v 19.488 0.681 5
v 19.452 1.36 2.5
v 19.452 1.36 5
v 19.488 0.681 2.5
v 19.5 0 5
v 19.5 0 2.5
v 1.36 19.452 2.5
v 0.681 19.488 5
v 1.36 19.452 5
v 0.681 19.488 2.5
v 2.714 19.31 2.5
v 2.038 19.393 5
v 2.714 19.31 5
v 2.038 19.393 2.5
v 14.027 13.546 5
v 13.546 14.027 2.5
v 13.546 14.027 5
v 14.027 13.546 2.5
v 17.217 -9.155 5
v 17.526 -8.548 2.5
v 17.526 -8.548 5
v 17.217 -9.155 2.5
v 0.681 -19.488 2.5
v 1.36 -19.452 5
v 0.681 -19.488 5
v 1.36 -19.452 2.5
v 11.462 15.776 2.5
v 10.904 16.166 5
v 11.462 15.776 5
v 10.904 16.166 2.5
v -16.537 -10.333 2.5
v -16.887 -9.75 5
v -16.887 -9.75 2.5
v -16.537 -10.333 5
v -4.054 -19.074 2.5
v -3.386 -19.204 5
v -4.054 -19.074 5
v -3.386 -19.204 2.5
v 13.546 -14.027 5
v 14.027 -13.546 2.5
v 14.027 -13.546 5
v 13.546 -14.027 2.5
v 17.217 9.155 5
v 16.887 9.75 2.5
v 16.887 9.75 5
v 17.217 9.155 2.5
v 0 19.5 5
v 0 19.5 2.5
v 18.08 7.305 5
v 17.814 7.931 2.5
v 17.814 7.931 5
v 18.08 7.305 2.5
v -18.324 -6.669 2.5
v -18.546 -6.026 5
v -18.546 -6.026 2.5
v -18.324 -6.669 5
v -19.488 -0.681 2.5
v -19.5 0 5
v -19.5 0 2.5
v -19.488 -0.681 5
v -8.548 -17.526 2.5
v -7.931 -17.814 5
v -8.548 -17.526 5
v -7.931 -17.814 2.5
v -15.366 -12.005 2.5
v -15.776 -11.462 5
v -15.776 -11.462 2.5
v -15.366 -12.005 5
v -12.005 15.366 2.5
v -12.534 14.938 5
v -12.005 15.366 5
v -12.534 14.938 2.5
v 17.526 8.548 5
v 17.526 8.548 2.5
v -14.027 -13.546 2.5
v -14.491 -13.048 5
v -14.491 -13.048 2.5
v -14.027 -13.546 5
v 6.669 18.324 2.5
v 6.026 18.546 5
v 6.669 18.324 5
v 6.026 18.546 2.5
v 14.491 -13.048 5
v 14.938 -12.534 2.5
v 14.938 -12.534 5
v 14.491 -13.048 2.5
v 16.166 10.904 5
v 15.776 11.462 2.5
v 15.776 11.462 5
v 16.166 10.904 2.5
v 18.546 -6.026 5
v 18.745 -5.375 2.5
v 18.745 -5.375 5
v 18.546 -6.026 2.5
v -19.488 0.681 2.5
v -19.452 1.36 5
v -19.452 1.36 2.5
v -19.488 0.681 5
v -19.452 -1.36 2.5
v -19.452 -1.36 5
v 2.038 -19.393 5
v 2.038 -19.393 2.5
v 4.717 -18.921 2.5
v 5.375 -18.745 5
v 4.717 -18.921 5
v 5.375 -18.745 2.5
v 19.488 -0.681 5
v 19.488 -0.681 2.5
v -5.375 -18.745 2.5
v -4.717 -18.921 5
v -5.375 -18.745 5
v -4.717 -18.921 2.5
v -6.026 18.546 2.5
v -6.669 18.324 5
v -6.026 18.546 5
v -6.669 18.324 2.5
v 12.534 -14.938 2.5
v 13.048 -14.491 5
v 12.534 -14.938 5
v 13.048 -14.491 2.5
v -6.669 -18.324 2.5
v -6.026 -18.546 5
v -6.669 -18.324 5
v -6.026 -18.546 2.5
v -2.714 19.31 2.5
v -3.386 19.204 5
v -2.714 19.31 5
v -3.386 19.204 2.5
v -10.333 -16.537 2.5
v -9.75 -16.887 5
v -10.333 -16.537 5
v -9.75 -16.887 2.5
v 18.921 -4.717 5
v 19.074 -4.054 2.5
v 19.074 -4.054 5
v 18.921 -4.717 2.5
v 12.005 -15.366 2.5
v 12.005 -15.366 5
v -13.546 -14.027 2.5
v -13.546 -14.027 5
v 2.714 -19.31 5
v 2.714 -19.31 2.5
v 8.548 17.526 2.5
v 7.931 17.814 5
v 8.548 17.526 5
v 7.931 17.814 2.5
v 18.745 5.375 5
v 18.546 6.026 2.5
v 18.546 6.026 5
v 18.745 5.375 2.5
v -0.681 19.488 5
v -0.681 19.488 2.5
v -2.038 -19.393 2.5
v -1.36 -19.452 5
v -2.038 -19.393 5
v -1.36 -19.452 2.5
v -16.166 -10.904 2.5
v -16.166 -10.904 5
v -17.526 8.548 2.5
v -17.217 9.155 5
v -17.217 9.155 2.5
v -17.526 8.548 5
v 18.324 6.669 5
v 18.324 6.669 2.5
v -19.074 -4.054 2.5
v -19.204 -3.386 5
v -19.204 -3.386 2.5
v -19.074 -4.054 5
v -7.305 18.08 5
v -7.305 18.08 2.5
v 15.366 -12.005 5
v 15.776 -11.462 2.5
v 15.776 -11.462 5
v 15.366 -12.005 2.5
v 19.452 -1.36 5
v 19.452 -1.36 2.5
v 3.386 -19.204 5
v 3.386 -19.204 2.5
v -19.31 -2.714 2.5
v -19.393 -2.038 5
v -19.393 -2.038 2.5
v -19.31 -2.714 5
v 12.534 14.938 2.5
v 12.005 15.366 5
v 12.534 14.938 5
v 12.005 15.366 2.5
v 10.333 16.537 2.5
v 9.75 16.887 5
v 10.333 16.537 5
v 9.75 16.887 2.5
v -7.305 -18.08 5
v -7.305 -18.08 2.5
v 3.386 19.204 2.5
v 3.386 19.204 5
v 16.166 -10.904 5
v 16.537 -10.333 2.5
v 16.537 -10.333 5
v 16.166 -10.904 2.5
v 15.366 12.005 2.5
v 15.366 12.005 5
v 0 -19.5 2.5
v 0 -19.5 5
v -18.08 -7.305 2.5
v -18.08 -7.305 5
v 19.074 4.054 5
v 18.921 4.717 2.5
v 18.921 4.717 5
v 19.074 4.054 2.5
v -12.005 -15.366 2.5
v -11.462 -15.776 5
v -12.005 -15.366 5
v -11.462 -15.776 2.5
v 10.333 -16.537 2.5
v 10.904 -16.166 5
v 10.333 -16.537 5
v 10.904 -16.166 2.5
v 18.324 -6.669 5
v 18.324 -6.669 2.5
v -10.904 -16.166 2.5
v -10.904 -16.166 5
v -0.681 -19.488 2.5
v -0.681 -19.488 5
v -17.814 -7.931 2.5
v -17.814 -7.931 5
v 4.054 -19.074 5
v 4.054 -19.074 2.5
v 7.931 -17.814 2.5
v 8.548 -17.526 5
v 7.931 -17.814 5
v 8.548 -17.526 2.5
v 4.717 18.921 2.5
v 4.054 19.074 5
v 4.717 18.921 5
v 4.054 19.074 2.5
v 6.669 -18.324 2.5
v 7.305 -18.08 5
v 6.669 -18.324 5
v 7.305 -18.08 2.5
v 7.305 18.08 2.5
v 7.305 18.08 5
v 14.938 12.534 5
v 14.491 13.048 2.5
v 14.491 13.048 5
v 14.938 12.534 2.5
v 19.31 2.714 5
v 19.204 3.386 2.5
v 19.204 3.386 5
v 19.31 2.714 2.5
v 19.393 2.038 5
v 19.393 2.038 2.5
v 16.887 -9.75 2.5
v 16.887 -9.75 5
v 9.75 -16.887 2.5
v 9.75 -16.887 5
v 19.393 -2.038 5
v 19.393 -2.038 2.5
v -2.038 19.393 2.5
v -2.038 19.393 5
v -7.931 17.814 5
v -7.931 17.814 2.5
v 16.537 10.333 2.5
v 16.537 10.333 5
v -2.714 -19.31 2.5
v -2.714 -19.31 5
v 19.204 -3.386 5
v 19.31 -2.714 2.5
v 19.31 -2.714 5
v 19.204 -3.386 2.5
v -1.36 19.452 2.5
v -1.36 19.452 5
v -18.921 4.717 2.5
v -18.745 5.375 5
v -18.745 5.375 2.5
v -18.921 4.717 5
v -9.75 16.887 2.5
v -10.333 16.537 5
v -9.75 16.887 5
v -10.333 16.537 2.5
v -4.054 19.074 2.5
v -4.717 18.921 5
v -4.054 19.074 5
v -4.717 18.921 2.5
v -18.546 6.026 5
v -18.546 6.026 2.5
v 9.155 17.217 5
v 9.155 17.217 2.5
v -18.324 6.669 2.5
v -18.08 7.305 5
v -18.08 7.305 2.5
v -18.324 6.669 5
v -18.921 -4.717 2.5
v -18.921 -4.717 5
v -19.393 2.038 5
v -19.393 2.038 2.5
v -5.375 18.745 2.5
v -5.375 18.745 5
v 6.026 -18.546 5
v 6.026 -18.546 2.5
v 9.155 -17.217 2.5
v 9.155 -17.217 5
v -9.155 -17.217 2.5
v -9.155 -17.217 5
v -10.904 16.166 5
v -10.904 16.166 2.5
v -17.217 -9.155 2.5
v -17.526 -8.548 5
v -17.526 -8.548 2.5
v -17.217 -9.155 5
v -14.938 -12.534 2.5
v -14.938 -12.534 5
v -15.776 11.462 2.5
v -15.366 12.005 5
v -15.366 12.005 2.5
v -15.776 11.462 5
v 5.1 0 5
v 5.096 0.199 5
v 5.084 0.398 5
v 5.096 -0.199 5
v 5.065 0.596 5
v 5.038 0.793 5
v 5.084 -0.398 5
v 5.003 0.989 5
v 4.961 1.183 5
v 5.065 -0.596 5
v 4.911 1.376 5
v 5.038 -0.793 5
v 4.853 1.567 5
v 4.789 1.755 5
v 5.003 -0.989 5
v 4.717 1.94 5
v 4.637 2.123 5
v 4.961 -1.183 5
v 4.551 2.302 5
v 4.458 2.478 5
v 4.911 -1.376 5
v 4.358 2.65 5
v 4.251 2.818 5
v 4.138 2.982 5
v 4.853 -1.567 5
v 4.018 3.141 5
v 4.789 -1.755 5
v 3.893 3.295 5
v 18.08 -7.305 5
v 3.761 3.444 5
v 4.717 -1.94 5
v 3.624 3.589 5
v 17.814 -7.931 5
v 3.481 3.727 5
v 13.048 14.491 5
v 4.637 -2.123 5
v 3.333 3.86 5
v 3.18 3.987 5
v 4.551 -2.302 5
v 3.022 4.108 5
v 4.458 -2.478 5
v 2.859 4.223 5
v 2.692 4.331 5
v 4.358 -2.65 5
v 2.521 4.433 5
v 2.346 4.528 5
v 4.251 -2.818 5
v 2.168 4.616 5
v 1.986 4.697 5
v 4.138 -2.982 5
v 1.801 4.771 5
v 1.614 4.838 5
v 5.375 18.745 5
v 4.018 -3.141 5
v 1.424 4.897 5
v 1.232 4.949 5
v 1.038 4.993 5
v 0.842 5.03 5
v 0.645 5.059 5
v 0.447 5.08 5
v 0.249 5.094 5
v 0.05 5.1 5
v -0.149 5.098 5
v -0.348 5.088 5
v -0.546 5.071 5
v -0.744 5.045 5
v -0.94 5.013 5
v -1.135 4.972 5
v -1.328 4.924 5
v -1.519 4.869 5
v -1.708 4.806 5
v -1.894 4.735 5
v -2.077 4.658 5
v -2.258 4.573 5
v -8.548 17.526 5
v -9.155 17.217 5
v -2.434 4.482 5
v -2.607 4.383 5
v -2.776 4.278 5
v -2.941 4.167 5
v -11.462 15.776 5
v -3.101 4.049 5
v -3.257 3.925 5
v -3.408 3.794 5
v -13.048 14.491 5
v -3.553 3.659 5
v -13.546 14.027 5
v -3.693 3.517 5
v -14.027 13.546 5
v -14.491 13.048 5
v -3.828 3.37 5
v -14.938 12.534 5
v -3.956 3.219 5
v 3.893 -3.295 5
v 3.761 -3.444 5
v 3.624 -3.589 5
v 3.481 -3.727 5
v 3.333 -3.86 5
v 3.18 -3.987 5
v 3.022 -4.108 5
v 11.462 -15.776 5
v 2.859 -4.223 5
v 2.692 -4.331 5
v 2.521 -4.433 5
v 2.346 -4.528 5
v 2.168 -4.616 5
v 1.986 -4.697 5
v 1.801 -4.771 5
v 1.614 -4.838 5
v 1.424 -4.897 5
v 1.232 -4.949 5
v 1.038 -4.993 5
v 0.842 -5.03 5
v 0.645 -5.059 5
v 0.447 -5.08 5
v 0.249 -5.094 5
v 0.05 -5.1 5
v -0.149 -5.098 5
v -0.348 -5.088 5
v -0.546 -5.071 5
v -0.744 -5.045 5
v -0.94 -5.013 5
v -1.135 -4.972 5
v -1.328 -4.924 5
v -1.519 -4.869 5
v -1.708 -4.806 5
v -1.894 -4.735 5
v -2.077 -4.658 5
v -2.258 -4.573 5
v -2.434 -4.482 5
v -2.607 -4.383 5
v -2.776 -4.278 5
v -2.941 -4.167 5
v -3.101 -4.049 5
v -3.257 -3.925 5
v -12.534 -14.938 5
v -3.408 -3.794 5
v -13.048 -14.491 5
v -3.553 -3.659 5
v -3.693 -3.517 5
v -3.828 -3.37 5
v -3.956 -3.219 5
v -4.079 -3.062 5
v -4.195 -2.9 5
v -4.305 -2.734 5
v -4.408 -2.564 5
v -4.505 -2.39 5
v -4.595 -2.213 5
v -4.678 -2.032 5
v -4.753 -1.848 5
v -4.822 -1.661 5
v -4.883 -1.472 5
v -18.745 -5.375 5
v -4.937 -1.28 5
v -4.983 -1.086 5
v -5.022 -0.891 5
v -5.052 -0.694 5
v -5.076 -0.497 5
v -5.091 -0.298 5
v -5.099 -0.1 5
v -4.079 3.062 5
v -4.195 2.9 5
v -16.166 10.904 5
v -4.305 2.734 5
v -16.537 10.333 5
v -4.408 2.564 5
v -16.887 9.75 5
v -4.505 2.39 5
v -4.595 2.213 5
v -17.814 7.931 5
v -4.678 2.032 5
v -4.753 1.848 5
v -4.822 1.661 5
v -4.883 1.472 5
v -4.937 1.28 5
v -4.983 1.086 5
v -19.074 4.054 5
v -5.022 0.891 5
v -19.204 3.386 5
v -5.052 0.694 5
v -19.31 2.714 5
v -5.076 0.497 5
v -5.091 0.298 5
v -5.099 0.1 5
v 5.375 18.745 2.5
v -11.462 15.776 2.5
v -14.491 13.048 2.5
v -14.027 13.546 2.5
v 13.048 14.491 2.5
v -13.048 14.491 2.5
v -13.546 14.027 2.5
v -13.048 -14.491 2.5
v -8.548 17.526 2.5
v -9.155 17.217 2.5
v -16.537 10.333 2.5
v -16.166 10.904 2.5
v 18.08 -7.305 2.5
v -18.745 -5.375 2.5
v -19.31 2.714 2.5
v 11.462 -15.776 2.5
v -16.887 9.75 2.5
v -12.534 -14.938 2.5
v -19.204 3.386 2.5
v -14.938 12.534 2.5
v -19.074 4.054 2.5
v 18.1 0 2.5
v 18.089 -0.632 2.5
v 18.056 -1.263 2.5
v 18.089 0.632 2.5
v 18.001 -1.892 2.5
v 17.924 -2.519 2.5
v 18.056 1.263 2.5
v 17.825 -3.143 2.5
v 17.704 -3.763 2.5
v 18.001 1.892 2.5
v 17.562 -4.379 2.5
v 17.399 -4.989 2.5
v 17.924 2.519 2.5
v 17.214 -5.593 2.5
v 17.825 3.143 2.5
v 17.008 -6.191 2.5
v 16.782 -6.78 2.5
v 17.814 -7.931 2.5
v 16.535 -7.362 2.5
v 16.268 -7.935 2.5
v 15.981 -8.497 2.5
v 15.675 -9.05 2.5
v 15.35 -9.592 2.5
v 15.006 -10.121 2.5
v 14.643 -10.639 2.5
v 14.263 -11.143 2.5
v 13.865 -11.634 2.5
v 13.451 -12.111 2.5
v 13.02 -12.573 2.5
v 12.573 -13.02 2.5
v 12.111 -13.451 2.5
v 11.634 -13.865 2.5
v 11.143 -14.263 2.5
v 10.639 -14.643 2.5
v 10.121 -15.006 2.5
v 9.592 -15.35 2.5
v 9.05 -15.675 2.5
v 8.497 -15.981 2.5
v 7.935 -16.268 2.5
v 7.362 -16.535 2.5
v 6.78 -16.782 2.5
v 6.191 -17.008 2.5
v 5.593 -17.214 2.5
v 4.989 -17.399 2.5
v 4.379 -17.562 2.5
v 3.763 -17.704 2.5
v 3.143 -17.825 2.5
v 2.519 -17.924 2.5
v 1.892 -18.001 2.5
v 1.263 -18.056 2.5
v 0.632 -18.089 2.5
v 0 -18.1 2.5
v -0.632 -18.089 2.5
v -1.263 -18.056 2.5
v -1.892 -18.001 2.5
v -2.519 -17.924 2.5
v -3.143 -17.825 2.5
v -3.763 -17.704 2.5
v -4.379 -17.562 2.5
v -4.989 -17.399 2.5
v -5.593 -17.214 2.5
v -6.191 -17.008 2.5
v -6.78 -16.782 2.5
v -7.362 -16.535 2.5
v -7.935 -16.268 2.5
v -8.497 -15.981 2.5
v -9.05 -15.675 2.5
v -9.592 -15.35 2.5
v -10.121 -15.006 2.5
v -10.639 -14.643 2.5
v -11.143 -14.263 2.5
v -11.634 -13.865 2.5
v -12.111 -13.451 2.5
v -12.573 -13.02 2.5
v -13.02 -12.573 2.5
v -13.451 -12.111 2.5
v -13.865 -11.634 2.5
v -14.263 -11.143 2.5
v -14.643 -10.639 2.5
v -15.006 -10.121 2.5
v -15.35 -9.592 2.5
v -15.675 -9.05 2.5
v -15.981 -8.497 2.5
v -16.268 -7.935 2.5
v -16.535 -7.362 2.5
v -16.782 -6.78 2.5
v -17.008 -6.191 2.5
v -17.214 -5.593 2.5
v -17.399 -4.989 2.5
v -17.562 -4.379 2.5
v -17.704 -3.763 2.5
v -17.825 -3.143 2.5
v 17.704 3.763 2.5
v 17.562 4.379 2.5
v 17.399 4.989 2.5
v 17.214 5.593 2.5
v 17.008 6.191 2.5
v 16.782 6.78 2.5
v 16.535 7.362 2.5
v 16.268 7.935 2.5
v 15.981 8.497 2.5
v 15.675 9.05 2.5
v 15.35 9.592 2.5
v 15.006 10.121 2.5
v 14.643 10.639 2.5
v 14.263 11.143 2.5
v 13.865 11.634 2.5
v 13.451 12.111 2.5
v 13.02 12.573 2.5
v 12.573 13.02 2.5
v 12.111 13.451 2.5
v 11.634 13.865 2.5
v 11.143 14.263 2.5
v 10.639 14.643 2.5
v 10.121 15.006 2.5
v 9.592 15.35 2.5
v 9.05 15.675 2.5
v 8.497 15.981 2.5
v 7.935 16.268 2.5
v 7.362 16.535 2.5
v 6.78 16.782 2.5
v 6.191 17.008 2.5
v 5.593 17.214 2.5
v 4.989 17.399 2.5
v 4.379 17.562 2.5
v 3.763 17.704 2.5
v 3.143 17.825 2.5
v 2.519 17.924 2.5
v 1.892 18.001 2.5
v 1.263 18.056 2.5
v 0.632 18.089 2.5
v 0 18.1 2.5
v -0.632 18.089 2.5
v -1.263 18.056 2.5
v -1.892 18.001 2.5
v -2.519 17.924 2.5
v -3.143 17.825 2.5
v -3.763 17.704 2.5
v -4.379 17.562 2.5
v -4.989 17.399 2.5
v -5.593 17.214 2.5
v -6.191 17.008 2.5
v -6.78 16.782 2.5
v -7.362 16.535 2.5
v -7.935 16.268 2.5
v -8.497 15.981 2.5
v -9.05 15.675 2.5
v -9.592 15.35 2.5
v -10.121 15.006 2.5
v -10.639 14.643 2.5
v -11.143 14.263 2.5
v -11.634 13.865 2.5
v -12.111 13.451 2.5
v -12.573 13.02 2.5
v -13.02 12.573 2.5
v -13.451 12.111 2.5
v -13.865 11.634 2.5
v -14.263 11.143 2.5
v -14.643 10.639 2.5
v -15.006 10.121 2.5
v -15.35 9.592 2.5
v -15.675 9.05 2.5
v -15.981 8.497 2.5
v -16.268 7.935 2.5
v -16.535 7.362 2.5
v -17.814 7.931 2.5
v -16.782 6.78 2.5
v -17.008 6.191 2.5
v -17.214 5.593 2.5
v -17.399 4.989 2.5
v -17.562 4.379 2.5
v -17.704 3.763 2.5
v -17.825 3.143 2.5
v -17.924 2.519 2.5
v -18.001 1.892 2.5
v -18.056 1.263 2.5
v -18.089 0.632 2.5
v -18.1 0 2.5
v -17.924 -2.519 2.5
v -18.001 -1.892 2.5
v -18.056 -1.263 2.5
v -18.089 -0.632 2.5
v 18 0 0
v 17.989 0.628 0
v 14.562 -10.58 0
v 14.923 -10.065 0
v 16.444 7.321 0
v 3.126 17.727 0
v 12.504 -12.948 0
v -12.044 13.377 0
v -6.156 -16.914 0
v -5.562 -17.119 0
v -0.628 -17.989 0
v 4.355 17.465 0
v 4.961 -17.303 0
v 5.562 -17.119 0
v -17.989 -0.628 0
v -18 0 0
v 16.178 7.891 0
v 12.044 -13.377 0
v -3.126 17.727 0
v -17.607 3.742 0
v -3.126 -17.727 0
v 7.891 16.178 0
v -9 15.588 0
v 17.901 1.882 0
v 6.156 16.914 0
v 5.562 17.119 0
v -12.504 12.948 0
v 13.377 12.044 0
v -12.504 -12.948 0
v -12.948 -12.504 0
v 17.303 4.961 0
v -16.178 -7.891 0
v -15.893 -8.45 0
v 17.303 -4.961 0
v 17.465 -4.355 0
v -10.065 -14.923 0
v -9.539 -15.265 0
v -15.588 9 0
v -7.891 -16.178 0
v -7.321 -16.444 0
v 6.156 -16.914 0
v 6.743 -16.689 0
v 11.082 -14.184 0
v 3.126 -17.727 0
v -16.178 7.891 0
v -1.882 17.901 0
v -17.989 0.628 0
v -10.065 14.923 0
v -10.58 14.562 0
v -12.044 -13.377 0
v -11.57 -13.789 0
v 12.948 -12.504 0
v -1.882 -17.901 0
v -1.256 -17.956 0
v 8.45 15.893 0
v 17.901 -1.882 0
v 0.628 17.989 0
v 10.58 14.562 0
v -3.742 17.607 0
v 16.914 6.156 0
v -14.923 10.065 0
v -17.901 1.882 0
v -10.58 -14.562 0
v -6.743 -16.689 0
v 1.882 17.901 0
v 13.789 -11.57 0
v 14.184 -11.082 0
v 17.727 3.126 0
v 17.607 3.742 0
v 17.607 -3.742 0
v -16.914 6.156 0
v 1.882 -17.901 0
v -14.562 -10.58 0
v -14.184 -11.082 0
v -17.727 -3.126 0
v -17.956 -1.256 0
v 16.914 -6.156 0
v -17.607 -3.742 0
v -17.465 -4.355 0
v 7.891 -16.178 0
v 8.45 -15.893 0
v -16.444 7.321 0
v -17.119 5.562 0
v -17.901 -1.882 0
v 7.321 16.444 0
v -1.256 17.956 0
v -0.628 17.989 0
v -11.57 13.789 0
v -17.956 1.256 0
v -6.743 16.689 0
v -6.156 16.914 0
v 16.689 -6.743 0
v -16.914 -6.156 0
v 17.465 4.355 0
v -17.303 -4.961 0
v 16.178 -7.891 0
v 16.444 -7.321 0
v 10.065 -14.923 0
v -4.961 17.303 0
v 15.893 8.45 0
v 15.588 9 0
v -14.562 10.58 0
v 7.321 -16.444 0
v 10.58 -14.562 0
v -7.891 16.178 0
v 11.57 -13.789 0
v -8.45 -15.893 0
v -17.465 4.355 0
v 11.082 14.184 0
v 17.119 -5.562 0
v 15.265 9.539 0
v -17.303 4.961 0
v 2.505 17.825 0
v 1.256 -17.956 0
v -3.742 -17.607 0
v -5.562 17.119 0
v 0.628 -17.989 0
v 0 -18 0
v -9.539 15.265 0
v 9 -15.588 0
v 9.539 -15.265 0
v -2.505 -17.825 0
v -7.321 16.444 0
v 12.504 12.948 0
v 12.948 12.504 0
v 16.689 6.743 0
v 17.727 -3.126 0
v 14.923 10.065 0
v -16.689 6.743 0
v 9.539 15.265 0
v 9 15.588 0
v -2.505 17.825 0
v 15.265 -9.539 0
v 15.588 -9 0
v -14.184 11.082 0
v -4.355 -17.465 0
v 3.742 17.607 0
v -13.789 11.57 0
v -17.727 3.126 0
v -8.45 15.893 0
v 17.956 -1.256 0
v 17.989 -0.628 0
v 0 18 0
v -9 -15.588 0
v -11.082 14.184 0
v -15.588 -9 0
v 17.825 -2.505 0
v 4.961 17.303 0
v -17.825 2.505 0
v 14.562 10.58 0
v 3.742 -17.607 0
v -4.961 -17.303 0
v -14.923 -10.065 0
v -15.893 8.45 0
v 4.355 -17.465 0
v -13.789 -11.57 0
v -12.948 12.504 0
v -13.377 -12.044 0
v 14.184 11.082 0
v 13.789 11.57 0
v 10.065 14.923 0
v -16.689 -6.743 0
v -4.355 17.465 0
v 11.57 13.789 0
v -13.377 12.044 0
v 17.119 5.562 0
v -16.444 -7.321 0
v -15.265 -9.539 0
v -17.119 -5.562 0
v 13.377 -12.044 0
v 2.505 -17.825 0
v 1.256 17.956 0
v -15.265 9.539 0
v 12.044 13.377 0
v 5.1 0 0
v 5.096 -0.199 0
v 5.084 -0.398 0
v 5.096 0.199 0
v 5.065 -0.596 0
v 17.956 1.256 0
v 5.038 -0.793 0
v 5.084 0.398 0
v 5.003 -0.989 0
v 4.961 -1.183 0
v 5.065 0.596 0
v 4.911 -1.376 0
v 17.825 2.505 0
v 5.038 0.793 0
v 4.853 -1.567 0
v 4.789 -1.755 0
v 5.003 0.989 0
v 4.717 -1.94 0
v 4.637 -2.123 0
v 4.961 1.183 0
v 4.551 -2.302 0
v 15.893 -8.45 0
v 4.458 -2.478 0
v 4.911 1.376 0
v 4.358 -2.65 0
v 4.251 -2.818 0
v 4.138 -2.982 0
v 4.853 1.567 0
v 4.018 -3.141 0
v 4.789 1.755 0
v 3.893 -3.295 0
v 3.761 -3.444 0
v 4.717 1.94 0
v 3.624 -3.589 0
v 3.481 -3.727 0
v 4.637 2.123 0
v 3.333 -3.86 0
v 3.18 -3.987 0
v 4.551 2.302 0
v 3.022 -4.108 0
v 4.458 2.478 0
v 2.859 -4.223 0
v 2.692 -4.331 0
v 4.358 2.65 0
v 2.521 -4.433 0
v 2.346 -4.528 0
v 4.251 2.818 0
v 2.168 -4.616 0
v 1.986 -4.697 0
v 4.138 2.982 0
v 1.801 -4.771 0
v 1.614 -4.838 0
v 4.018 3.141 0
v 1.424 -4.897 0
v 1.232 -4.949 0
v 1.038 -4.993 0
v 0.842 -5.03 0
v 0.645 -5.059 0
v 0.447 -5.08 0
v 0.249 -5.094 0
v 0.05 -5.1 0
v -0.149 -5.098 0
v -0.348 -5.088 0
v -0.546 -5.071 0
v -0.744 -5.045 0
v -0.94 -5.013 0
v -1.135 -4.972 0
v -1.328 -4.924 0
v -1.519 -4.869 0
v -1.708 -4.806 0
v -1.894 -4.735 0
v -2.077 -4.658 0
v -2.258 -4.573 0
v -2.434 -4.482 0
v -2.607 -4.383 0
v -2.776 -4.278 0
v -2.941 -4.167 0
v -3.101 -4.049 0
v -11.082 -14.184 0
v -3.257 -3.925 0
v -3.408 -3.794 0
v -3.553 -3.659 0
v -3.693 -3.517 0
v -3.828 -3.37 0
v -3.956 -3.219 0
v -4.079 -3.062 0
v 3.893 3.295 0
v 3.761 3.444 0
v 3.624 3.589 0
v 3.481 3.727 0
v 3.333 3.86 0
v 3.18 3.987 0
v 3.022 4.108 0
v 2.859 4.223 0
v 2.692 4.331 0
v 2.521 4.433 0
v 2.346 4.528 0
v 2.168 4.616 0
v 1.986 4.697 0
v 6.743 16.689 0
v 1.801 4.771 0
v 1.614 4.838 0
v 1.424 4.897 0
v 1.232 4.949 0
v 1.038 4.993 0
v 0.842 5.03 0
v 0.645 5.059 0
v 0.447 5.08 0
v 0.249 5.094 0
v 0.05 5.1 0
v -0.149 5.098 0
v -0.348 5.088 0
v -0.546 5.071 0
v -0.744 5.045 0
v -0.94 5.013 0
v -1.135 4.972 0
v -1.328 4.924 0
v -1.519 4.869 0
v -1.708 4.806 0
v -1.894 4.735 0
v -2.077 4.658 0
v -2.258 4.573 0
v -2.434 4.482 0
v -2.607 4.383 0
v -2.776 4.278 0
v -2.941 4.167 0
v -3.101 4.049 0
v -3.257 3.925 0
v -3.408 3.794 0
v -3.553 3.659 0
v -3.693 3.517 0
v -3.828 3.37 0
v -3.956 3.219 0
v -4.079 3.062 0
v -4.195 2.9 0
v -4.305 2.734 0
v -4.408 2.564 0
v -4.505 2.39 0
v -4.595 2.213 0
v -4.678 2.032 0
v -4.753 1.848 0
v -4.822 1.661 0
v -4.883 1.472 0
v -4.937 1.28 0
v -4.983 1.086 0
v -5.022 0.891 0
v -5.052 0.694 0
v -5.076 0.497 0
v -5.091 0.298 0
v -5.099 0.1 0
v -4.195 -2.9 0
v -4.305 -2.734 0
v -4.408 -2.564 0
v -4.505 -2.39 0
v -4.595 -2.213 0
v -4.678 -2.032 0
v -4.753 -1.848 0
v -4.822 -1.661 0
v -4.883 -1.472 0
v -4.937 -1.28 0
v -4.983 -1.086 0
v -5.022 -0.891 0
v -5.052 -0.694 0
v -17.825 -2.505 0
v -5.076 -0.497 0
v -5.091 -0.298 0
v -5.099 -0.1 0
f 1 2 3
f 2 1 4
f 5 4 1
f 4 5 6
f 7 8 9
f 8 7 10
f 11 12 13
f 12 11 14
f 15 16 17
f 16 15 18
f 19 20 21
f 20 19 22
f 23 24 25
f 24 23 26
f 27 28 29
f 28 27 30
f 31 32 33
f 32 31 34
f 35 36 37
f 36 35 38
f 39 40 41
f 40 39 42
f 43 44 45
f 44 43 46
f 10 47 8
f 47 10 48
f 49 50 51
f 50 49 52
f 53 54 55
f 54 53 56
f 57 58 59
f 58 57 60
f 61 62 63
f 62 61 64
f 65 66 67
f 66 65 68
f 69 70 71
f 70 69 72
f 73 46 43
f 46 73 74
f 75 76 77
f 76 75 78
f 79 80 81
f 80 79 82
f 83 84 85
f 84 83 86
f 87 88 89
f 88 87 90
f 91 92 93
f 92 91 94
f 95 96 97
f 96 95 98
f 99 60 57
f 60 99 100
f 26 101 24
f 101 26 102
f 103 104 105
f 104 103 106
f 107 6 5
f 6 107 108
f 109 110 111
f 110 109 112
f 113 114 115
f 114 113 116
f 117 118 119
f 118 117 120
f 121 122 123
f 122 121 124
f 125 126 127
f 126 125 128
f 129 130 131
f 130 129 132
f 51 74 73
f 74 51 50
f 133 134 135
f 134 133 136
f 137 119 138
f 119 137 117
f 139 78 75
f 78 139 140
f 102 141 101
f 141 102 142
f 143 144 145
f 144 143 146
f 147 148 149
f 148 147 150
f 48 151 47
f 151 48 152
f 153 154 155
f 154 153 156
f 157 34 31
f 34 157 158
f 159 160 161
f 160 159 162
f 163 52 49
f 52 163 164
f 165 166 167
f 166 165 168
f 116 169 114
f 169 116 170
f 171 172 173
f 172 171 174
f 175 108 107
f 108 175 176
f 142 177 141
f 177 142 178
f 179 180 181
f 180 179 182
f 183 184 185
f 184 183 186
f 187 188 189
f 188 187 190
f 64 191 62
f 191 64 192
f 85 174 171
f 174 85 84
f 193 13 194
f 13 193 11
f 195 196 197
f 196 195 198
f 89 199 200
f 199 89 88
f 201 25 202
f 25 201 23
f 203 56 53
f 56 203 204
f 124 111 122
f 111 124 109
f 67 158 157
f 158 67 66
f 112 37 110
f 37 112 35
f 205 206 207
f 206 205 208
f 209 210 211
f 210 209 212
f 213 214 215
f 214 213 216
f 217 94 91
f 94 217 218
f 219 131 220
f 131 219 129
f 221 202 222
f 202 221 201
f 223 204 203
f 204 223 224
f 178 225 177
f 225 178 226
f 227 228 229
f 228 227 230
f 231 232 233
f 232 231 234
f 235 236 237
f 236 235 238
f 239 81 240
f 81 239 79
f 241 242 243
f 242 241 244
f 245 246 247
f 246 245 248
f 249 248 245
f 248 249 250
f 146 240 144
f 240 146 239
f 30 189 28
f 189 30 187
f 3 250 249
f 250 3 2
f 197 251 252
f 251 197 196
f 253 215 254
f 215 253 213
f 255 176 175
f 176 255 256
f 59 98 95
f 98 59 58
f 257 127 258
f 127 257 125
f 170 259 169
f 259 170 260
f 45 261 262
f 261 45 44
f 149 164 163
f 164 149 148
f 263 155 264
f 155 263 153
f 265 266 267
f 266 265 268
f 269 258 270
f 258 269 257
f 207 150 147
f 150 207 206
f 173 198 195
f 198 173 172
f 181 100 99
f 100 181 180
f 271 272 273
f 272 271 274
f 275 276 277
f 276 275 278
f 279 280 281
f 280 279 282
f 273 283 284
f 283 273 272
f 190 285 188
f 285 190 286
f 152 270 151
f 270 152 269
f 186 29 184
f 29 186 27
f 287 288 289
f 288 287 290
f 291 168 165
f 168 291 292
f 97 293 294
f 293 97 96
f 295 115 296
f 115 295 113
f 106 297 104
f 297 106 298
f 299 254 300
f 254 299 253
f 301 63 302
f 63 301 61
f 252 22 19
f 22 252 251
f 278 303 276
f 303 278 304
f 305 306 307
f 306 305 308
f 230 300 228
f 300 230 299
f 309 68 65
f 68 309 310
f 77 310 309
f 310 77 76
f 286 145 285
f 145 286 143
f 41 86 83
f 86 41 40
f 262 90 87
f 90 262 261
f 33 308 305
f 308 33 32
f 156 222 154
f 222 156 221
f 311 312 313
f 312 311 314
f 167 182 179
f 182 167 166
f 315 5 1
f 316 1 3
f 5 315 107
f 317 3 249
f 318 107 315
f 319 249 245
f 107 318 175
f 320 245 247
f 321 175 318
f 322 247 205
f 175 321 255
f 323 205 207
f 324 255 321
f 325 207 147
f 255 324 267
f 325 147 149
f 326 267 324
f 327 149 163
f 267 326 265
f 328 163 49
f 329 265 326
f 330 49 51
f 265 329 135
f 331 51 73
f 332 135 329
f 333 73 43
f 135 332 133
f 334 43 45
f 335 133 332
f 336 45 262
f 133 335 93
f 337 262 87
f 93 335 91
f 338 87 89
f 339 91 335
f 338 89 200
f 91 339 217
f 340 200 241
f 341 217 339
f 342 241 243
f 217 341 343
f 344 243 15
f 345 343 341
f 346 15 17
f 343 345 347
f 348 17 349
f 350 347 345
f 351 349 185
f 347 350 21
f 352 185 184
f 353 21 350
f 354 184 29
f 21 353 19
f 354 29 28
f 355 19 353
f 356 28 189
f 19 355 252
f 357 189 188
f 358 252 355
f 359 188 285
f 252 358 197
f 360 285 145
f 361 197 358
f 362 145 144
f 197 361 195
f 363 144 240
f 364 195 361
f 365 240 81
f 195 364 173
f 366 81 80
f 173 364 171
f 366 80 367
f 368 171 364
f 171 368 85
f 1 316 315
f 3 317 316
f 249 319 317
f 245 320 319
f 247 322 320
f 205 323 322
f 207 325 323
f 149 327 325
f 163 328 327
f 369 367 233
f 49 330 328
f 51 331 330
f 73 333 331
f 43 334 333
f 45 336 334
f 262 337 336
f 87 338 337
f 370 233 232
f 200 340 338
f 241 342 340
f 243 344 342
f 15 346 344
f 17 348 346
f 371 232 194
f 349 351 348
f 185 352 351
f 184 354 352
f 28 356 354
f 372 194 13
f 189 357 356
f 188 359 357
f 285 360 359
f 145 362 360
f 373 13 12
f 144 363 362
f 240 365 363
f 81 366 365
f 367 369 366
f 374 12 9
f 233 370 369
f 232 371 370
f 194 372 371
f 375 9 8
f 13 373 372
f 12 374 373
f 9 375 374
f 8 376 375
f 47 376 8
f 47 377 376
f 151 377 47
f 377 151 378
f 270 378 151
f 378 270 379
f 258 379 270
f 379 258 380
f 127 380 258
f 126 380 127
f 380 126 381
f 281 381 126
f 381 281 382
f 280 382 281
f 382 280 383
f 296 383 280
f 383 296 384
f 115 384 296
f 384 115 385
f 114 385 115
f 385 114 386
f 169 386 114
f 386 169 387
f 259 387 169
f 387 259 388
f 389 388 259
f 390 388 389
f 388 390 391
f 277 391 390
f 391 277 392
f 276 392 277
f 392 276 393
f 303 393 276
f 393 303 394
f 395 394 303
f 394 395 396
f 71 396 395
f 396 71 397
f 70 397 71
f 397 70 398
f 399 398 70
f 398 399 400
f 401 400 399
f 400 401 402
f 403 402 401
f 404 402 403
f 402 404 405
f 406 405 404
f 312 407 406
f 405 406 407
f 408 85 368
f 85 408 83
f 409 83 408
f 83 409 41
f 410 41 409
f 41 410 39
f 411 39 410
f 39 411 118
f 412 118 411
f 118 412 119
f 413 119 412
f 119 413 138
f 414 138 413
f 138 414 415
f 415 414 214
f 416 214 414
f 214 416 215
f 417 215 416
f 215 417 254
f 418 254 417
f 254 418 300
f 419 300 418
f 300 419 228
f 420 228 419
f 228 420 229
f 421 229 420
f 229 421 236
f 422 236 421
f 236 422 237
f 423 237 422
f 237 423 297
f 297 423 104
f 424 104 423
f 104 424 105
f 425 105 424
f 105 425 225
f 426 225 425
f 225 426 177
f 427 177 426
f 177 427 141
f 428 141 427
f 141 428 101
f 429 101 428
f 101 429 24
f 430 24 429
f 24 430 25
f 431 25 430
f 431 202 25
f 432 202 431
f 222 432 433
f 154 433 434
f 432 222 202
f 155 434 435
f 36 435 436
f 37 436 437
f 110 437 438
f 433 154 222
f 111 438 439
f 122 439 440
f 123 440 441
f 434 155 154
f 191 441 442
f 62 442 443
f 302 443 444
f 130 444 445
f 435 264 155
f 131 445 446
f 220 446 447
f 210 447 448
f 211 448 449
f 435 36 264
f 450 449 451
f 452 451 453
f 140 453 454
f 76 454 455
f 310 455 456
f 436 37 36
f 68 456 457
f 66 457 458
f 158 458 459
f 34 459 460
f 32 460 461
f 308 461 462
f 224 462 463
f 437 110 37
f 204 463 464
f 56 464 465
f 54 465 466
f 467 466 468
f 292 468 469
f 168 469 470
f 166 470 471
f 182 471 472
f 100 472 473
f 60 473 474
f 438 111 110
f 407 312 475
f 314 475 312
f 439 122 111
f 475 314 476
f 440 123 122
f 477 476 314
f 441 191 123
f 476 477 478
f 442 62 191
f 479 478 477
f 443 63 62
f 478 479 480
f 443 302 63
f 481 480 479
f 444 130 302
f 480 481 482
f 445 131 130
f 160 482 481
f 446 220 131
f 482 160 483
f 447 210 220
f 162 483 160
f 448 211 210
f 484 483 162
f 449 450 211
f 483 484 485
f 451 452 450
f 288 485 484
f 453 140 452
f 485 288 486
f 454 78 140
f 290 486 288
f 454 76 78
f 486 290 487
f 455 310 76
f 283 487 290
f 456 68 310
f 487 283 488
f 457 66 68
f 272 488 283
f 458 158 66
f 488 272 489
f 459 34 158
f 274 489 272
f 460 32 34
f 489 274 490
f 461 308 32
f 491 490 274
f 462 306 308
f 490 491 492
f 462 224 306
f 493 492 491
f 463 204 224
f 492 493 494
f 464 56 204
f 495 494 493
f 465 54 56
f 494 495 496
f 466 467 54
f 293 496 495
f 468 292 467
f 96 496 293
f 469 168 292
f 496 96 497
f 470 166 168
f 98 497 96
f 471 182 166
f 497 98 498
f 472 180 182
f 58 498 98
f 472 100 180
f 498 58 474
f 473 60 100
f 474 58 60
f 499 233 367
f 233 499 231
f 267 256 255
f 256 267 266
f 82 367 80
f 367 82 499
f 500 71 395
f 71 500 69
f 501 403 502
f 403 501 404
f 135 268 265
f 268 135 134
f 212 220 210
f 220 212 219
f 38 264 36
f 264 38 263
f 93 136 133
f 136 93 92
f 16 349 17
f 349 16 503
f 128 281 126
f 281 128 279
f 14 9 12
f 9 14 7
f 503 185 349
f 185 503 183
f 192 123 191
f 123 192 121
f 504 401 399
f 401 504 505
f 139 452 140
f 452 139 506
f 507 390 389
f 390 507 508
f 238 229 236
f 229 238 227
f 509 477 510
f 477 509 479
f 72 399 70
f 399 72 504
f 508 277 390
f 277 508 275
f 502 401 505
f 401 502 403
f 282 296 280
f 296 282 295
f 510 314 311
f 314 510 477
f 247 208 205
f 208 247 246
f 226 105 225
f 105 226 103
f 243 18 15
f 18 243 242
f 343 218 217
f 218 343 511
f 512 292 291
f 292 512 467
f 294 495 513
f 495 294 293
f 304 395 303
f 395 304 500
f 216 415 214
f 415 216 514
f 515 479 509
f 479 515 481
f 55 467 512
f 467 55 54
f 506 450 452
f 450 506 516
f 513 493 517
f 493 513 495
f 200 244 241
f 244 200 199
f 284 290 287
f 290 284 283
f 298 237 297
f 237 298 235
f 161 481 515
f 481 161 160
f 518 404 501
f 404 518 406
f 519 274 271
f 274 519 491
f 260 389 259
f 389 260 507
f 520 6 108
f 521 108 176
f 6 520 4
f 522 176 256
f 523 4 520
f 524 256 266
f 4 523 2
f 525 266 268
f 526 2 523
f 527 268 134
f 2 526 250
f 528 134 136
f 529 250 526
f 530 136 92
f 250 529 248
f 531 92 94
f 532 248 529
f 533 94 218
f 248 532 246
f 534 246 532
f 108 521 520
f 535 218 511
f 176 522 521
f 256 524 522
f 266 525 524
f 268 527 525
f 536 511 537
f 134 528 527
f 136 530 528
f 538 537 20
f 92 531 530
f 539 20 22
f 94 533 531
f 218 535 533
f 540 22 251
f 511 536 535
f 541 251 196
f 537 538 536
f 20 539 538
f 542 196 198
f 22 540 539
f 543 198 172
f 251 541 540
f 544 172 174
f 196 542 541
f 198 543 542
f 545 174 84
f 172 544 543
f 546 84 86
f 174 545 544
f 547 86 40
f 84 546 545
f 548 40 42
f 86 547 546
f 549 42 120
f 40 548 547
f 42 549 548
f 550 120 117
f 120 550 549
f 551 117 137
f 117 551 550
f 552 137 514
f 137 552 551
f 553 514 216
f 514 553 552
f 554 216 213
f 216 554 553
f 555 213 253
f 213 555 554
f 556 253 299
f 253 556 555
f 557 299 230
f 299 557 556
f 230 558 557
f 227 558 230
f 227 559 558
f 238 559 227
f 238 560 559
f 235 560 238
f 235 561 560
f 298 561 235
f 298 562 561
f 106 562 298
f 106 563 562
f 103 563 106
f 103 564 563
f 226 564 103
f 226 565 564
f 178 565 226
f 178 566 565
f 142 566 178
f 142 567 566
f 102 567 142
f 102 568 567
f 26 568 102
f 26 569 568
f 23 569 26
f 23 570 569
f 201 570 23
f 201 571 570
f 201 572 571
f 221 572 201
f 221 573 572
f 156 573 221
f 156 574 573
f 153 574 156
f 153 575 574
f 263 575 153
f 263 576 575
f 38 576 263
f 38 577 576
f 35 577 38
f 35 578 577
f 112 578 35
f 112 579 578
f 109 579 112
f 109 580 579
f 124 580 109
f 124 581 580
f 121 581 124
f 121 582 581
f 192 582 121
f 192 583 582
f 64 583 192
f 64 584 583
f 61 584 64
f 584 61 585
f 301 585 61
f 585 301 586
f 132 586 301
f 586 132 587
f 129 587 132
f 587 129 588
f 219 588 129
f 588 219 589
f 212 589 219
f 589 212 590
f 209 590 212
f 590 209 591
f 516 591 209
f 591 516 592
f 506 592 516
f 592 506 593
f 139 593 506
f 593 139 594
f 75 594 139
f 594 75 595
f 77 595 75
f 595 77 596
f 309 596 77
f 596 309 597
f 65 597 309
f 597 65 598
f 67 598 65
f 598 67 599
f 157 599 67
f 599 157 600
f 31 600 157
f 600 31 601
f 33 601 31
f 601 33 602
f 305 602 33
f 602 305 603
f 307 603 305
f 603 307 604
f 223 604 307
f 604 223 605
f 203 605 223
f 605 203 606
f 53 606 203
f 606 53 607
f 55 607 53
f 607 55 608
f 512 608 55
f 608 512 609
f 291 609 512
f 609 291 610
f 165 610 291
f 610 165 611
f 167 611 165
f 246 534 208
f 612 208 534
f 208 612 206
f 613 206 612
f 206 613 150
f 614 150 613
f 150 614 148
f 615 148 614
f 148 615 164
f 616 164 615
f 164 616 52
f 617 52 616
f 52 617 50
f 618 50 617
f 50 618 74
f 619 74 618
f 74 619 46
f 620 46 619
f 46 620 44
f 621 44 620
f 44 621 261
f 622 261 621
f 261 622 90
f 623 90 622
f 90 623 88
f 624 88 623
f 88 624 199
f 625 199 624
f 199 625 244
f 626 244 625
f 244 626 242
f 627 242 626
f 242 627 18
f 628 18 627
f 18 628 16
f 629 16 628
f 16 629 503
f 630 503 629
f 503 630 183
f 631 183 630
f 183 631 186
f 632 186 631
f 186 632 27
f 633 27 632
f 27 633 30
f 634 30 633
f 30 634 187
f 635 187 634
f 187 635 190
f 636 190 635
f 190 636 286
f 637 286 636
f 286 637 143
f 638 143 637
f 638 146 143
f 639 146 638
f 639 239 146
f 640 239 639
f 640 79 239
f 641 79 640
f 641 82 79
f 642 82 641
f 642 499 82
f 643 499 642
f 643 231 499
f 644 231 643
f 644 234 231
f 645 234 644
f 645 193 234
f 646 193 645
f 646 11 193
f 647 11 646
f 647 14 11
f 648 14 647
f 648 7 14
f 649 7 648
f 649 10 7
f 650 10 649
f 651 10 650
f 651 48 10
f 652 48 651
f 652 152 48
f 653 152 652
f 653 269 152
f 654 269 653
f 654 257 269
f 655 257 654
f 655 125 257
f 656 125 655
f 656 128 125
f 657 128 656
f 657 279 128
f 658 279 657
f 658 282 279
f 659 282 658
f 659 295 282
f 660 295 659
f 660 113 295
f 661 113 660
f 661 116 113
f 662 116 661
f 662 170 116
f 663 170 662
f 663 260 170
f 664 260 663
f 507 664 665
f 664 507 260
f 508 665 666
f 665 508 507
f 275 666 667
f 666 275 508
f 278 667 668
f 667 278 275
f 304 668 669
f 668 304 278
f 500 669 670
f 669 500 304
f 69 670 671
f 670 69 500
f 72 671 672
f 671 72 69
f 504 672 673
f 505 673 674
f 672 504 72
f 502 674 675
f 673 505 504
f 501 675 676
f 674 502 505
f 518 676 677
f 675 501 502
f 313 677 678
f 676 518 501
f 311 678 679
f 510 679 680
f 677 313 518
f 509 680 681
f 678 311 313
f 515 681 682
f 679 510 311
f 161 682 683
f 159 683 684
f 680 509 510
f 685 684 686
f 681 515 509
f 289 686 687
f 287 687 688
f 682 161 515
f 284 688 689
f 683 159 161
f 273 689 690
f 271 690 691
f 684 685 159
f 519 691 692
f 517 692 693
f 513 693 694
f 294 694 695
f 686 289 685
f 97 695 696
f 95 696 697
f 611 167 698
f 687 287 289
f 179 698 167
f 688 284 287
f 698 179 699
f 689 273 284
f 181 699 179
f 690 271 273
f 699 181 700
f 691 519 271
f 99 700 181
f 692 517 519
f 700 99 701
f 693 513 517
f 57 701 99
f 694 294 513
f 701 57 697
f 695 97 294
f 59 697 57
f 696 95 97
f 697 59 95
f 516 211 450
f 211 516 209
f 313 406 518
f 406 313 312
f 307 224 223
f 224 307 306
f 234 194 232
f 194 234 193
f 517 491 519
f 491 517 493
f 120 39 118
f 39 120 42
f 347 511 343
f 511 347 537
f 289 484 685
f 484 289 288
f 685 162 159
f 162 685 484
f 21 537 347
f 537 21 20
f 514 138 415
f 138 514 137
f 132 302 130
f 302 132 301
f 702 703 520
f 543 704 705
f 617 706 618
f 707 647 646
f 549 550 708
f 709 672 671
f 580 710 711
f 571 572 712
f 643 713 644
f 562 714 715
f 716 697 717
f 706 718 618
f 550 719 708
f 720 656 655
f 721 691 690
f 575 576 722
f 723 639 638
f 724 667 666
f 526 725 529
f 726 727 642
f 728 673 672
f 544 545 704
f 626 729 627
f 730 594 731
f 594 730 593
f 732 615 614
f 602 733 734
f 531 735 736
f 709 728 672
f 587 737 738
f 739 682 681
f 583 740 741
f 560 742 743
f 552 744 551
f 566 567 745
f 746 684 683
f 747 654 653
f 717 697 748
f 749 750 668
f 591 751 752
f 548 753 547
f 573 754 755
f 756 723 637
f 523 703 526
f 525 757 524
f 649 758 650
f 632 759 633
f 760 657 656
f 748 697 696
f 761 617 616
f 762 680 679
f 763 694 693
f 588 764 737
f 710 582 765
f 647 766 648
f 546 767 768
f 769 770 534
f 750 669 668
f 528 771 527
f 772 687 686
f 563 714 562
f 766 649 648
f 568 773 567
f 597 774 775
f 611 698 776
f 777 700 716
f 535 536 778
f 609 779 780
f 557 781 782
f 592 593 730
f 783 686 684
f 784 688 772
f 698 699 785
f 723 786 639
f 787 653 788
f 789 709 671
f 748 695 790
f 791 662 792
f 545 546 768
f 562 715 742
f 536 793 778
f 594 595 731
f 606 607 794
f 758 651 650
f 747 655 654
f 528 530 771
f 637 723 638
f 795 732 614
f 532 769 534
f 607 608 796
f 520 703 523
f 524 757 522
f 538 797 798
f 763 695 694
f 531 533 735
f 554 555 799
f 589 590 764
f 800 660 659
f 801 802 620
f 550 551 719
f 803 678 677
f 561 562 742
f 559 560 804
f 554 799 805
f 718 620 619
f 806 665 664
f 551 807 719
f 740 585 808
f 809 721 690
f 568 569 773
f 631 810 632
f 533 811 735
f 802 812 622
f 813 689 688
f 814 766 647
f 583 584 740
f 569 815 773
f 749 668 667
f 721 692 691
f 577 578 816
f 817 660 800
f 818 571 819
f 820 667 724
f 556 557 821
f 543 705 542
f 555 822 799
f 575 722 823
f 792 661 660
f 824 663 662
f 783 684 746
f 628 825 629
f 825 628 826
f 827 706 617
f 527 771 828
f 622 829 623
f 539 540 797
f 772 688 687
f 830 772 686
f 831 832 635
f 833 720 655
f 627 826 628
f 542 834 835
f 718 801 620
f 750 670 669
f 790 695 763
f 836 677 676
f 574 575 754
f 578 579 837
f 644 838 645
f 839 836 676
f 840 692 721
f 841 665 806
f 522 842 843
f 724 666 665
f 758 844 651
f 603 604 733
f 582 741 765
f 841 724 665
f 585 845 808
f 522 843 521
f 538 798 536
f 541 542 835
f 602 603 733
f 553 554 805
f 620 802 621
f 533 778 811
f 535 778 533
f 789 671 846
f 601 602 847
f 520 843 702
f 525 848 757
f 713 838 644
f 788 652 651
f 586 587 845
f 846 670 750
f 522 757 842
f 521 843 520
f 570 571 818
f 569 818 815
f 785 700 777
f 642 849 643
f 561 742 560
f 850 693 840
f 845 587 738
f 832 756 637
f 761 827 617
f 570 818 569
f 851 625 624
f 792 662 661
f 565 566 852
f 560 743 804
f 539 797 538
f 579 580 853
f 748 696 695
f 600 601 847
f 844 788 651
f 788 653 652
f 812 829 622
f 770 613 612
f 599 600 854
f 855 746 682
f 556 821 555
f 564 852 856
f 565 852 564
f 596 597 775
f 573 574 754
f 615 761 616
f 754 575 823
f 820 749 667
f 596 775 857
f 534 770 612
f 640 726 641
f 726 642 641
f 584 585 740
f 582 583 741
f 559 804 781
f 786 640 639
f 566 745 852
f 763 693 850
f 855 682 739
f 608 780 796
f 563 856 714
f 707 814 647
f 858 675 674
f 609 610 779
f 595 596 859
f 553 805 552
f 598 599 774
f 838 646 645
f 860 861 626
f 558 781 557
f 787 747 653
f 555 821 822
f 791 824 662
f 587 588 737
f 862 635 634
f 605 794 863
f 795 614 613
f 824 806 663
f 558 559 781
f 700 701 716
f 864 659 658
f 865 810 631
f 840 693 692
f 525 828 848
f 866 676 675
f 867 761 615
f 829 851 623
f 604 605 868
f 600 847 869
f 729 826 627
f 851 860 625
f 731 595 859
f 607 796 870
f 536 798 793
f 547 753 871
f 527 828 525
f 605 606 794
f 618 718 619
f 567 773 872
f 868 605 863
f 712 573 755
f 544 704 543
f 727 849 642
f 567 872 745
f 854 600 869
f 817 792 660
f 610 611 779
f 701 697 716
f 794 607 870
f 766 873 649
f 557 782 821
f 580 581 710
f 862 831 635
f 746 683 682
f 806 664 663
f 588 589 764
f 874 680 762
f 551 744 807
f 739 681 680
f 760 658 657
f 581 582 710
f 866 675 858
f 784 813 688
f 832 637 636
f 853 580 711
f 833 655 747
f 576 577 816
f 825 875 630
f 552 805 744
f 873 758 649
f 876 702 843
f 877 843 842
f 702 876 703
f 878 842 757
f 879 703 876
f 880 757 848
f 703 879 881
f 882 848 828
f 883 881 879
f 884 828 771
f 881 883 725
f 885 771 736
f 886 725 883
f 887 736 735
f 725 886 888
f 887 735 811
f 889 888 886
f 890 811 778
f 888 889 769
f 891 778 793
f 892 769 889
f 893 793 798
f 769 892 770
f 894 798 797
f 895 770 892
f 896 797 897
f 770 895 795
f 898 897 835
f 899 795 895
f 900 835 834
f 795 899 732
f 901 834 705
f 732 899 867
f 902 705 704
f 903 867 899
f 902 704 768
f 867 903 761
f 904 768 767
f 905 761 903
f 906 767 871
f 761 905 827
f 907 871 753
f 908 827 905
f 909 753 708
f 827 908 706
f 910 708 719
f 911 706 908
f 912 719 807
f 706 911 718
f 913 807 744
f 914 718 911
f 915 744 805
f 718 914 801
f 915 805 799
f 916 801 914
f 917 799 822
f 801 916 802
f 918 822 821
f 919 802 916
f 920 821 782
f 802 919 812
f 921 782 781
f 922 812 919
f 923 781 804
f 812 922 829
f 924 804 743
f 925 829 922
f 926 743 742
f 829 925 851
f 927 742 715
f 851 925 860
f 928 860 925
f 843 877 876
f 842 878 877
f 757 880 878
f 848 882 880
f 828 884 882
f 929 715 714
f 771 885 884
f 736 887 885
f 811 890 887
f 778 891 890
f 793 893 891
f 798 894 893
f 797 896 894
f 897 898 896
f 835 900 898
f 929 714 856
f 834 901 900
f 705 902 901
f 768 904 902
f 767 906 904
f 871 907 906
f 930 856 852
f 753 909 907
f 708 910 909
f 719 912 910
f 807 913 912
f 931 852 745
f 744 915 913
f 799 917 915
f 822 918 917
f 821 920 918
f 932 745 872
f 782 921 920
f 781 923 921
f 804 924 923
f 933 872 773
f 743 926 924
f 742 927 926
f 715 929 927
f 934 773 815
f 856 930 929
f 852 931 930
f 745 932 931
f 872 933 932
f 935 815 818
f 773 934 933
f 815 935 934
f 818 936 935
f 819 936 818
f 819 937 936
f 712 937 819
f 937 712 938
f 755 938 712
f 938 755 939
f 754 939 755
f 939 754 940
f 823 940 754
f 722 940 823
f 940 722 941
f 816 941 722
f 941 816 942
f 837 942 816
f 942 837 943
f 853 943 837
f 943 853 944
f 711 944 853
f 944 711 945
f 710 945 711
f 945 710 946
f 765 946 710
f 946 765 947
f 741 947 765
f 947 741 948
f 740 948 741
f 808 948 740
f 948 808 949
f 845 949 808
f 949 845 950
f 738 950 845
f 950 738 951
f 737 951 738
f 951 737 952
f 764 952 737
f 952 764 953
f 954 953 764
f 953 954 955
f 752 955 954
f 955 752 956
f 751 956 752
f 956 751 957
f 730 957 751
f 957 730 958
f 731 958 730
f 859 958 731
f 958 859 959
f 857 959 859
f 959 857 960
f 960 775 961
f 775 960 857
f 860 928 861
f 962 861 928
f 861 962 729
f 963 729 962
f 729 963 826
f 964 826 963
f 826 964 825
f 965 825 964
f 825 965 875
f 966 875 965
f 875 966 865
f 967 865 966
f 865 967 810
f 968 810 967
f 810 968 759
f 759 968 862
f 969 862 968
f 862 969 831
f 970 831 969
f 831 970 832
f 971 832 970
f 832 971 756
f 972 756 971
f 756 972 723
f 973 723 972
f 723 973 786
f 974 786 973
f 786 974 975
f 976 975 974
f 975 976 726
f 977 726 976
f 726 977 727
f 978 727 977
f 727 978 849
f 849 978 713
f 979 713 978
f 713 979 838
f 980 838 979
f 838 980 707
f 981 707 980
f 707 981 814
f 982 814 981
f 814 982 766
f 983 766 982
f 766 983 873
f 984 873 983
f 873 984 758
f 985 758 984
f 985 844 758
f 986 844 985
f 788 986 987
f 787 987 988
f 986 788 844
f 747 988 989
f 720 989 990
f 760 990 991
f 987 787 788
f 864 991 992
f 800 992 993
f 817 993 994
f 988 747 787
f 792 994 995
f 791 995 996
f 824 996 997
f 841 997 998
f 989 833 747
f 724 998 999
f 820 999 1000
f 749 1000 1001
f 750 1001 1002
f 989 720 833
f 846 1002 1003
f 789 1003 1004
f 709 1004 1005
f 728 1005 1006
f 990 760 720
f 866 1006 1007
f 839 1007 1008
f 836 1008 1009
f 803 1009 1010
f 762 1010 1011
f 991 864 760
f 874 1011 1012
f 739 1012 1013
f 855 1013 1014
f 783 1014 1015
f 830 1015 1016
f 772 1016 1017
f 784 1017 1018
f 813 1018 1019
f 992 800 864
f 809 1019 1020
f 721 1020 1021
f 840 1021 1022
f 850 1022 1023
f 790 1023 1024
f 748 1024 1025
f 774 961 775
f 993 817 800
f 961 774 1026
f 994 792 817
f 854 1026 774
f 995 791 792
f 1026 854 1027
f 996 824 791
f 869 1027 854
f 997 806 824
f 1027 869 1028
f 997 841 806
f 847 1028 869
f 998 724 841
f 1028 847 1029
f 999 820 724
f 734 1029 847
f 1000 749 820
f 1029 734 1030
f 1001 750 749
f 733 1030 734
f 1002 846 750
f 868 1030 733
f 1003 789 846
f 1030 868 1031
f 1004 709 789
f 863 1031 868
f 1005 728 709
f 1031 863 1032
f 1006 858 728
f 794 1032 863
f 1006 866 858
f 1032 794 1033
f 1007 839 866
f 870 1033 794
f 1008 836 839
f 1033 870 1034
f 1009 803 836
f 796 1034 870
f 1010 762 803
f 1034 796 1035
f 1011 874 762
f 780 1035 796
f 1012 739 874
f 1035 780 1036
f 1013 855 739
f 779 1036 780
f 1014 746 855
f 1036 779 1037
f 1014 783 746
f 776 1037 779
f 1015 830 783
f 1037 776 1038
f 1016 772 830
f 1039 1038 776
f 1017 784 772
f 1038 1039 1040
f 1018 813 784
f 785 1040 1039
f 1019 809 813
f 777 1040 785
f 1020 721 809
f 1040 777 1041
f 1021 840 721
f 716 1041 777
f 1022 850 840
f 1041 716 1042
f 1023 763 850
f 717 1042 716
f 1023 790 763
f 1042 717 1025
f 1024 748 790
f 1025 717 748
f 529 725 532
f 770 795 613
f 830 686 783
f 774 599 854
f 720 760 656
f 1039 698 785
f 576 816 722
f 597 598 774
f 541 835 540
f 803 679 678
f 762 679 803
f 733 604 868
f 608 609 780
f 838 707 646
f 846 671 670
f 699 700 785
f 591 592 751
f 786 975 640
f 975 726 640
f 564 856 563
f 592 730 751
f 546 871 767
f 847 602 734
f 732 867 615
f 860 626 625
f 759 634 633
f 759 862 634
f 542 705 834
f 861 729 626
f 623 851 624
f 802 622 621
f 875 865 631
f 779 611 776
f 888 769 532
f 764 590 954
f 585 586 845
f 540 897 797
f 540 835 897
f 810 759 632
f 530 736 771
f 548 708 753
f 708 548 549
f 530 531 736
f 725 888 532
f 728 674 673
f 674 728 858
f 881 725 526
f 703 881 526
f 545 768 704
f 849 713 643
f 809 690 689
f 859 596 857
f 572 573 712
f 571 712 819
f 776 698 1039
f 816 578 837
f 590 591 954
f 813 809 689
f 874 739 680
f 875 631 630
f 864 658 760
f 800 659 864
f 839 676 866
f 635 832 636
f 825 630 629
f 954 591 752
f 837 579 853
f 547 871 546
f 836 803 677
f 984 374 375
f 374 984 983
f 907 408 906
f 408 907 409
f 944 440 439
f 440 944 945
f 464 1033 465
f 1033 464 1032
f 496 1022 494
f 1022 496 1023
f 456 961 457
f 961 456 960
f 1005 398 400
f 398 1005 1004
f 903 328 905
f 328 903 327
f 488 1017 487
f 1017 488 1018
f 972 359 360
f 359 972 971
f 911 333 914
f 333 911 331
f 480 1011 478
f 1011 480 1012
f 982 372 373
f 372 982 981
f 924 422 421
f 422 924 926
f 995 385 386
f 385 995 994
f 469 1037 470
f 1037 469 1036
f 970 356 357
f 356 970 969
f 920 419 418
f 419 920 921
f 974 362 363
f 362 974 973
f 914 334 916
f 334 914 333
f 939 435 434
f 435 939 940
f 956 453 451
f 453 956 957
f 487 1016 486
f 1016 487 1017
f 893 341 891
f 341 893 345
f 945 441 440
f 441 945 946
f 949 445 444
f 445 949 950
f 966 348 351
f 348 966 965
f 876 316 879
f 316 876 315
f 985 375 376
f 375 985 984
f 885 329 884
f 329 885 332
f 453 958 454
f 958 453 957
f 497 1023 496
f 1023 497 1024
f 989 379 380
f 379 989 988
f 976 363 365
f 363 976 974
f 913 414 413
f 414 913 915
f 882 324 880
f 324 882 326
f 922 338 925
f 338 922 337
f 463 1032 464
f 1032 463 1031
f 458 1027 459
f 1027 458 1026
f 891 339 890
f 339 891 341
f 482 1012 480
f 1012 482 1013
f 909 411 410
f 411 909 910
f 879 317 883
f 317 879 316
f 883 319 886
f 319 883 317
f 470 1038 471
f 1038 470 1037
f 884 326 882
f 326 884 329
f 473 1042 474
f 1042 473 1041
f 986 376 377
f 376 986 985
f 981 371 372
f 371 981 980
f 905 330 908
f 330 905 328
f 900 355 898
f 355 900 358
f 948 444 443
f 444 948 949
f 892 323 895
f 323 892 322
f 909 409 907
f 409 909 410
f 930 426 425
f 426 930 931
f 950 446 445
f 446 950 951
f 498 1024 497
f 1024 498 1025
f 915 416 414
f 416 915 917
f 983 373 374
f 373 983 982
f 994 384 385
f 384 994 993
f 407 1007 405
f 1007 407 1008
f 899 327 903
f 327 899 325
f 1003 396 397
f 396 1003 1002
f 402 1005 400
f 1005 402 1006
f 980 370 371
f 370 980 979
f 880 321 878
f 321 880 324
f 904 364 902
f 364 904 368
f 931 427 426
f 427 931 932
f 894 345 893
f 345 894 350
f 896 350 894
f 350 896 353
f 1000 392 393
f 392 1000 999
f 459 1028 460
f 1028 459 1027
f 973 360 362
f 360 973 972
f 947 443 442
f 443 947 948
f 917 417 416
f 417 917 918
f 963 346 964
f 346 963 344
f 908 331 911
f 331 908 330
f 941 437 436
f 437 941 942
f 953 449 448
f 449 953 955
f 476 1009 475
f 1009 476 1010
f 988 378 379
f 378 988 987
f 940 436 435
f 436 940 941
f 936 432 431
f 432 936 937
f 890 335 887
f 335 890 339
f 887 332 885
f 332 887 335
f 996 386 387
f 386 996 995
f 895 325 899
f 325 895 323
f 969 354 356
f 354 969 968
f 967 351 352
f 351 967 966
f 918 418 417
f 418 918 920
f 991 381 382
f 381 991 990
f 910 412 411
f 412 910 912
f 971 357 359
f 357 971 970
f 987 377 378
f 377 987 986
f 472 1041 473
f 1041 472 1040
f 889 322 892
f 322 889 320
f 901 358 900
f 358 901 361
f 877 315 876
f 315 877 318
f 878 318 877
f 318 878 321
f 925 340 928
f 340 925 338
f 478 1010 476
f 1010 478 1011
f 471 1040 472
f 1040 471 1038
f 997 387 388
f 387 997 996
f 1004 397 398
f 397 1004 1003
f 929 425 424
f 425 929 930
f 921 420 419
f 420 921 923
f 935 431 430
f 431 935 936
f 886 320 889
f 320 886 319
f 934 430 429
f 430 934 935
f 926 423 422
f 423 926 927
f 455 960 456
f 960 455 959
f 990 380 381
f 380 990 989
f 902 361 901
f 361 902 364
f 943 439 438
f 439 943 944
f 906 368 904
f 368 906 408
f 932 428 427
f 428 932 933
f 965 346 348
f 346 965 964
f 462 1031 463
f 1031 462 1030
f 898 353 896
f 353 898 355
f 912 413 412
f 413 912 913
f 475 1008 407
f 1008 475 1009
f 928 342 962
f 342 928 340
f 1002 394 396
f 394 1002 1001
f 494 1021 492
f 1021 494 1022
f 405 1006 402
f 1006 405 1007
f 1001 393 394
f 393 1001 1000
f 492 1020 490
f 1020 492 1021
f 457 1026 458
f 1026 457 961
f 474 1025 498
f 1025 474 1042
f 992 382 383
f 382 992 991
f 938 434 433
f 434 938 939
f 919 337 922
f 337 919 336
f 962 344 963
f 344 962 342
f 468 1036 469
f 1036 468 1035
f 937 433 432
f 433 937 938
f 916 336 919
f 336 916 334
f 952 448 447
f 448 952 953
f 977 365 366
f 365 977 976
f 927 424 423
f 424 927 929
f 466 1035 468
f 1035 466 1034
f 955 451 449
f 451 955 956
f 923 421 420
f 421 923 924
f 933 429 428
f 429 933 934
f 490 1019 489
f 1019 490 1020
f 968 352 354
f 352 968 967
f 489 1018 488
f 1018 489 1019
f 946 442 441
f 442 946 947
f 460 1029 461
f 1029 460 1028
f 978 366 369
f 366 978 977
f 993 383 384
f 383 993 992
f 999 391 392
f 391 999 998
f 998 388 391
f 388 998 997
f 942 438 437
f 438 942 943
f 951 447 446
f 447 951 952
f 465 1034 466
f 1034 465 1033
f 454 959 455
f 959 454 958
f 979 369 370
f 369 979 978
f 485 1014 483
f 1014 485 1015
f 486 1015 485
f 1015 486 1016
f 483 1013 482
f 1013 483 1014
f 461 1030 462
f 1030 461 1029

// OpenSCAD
$fs=0.2;
$fa=2;
// inner diameter
diameter = 36;
//inner height
height = 2.5;
//diameter of hole for lamp nipple
hole_diameter=10.2;
//width of lip
lip_width=3;


difference(){
  union(){
    //positive
    translate([0, 0, height]){
      cylinder(r=(diameter/2)+(lip_width/2), h=height);
    } 
    cylinder(r1 = (diameter/2), r2=(diameter/2)+0.1, h=height);
  }
  //negative
  cylinder(r=hole_diameter/2, h=height*2);
}
